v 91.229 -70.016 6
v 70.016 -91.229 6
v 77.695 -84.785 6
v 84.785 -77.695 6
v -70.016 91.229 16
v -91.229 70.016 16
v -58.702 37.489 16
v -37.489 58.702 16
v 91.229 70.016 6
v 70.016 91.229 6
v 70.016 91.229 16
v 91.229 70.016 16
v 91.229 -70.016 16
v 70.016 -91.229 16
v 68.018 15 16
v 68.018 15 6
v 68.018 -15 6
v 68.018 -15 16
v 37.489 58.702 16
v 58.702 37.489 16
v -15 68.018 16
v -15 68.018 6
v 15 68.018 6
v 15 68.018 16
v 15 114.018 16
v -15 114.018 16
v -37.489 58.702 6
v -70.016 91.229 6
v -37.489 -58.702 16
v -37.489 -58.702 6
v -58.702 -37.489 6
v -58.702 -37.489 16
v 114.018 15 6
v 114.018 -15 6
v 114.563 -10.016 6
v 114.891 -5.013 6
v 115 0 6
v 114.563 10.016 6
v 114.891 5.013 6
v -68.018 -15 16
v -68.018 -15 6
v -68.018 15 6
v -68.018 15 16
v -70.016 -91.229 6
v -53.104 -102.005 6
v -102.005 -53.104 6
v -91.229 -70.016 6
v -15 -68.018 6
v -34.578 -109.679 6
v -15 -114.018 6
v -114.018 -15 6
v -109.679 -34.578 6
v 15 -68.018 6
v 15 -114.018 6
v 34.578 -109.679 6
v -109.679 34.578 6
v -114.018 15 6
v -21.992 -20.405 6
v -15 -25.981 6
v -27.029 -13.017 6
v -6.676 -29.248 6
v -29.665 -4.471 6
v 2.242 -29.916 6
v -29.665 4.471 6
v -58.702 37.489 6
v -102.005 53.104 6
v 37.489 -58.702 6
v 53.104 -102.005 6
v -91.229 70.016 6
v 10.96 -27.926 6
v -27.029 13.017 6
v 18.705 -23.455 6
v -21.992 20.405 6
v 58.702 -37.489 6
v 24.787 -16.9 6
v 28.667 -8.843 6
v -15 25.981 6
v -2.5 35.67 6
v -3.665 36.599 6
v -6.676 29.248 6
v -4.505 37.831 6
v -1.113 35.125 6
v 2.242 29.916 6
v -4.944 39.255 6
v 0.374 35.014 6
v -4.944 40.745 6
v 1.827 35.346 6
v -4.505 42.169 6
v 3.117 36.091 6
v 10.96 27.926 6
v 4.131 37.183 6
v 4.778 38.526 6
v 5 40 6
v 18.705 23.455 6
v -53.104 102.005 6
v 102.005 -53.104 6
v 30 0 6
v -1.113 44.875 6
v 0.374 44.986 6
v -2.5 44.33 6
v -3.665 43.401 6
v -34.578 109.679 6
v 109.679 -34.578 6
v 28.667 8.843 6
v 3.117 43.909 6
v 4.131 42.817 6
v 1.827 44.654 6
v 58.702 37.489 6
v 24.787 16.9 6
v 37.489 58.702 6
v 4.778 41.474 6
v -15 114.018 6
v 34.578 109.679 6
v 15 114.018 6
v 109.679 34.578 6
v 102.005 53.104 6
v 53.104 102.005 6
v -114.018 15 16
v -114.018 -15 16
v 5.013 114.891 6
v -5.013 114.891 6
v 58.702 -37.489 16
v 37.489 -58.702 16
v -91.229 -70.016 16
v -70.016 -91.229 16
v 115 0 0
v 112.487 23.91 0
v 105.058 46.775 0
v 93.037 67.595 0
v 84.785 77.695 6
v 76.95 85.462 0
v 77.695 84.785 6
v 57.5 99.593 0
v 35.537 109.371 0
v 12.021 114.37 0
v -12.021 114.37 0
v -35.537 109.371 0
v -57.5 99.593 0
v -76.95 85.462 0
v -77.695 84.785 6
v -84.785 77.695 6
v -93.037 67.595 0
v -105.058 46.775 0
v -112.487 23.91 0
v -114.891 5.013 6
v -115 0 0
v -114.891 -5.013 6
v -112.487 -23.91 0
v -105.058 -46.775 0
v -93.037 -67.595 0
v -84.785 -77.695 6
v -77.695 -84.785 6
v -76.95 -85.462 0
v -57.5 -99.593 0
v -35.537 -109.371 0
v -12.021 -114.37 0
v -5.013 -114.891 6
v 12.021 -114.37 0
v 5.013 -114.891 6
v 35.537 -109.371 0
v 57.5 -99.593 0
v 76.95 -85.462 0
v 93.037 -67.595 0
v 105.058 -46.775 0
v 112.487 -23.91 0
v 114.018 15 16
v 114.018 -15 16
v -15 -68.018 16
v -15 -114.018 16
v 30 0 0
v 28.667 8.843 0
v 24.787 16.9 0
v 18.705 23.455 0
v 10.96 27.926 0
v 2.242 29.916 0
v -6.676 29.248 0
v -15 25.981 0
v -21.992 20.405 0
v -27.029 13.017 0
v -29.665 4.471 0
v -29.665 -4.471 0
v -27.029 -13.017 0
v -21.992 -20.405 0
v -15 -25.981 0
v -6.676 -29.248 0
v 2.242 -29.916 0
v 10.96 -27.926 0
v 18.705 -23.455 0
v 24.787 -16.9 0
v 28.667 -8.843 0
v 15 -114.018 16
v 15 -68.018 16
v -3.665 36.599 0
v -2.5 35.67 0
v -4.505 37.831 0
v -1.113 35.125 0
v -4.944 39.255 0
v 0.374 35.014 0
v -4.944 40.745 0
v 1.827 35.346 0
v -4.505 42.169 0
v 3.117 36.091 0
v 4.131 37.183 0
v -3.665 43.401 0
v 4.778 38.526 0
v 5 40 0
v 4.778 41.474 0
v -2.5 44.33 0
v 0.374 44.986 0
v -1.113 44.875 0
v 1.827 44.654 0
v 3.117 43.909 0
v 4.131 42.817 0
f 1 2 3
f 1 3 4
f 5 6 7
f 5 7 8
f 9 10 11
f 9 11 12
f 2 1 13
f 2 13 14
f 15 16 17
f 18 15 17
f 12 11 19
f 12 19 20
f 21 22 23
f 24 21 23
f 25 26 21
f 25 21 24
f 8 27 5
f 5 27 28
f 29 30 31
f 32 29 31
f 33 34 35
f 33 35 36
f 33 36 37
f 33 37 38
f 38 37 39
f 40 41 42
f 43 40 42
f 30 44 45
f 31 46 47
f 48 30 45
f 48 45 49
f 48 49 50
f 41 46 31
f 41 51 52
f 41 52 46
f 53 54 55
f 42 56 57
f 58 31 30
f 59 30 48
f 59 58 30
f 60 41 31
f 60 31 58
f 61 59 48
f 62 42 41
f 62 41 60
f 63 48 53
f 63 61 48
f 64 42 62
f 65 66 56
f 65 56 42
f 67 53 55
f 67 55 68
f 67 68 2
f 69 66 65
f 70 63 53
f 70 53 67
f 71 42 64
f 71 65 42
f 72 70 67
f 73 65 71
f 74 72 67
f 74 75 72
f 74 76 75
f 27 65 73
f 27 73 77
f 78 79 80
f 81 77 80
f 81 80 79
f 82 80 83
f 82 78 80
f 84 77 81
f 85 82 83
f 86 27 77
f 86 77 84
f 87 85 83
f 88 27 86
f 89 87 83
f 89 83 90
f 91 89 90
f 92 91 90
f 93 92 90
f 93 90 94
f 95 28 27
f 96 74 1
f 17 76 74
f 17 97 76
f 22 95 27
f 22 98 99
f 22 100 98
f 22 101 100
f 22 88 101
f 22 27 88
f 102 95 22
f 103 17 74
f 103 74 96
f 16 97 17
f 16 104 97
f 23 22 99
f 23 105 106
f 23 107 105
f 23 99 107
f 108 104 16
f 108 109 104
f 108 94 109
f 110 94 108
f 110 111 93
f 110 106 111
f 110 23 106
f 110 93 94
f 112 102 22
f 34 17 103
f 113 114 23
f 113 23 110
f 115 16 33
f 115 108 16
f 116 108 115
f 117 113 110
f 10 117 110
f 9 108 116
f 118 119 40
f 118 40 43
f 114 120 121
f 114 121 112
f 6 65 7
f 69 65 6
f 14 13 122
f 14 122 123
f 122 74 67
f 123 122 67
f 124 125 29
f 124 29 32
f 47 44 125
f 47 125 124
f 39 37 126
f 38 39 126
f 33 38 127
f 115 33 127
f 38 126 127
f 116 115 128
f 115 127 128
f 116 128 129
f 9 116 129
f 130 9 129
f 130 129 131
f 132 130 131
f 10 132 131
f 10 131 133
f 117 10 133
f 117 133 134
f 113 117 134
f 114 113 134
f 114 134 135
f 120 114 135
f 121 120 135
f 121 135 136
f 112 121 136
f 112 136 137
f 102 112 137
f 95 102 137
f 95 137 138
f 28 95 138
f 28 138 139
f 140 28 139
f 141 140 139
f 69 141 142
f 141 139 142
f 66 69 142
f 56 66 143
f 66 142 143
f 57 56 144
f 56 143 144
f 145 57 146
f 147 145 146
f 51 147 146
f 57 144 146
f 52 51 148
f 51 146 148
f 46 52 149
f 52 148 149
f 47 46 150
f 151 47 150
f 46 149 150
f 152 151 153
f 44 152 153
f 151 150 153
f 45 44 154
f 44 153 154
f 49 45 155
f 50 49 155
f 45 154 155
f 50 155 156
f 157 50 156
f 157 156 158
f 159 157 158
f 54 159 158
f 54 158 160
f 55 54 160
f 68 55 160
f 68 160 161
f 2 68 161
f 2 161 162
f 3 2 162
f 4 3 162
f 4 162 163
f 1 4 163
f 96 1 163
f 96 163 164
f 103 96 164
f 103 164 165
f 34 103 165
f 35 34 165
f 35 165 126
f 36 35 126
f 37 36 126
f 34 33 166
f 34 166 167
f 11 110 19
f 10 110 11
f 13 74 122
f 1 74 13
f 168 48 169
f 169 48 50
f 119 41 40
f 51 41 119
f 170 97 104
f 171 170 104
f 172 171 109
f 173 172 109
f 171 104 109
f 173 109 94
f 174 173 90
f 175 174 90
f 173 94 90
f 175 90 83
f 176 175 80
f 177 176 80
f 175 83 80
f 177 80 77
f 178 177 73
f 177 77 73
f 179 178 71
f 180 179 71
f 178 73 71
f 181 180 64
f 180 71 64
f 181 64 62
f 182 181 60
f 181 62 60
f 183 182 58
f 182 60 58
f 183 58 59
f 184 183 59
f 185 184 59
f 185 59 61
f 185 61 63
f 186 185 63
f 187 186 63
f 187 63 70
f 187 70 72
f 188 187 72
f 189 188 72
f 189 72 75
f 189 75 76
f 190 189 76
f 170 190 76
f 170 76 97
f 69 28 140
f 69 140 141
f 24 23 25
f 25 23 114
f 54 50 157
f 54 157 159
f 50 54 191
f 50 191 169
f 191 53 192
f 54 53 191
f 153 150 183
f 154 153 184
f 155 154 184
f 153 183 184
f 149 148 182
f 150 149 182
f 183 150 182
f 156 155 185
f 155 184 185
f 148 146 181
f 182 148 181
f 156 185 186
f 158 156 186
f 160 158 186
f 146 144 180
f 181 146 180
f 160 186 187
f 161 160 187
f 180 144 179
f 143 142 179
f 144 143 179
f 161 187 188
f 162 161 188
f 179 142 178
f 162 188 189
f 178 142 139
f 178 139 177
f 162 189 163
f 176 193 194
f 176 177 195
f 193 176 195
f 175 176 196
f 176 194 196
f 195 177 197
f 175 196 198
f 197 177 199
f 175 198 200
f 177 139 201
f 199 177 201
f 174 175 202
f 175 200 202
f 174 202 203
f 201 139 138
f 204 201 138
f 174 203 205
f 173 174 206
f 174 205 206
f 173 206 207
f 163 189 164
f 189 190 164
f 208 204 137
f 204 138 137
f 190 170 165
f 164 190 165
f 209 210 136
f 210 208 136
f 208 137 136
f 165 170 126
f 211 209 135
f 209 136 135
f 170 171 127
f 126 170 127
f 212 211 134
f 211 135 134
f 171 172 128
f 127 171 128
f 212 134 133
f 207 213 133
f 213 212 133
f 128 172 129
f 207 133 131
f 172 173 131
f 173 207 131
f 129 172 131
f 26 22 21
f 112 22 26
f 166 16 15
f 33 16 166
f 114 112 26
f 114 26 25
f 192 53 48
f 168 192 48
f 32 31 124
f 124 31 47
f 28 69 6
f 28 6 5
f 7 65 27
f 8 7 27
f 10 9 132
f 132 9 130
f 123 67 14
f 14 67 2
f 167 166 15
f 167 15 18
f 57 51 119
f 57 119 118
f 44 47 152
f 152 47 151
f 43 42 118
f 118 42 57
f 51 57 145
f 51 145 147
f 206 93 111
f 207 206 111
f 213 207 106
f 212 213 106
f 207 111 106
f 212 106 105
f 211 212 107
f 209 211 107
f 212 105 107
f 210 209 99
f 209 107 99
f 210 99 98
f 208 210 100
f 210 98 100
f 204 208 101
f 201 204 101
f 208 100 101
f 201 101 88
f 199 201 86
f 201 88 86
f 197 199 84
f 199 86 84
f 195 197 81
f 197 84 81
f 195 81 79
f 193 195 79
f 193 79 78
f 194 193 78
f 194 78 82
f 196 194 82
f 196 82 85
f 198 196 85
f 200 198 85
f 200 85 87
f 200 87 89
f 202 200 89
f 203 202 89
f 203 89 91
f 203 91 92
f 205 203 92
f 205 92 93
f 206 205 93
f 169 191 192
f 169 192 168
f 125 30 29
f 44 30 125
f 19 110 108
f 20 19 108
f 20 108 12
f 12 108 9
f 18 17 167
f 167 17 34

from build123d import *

# Parameters (mm, degrees)
SCHIZZO1_R                  = 115
ESTRUSIONE1_DEPTH           = 6
SCHIZZO2_W                  = 30
SCHIZZO2_H                  = 46
ESTRUSIONE2_DEPTH           = 10
RIPETIZIONECIRCOLARE1_COUNT = 8
SCHIZZO4_R                  = 30
ESTRUSIONE3_DEPTH           = 163.941707368
SCHIZZO5_R                  = 5
ESTRUSIONE4_DEPTH           = 163.941707368


with BuildPart() as part:
    # Schizzo1 → Estrusione1 (new body)
    with BuildSketch(Plane.XY):
        Circle(SCHIZZO1_R)
    extrude(amount=ESTRUSIONE1_DEPTH)

    # Schizzo2 → Estrusione2 (add)
    with BuildSketch(Plane.XY.offset(6)):
        with Locations((0, 91.01754251)):
            Rectangle(SCHIZZO2_W, SCHIZZO2_H)
    estrusione2 = extrude(amount=ESTRUSIONE2_DEPTH)

    # RipetizioneCircolare1: Estrusione2 ×8 about axis
    ripetizionecircolare1_axis = Axis((0, 0, 6), (0, 0, -1))
    for i in range(1, RIPETIZIONECIRCOLARE1_COUNT):
        add(estrusione2.rotate(ripetizionecircolare1_axis, i * 360 / RIPETIZIONECIRCOLARE1_COUNT))

    # Schizzo4 → Estrusione3 (cut, through all)
    with BuildSketch(Plane.XY.offset(6)):
        Circle(SCHIZZO4_R)
    extrude(amount=-ESTRUSIONE3_DEPTH, mode=Mode.SUBTRACT)

    # Schizzo5 → Estrusione4 (cut, through all)
    with BuildSketch(Plane.XY.offset(6)):
        with Locations((0, 40)):
            Circle(SCHIZZO5_R)
    extrude(amount=-ESTRUSIONE4_DEPTH, mode=Mode.SUBTRACT)


solid = part.part
